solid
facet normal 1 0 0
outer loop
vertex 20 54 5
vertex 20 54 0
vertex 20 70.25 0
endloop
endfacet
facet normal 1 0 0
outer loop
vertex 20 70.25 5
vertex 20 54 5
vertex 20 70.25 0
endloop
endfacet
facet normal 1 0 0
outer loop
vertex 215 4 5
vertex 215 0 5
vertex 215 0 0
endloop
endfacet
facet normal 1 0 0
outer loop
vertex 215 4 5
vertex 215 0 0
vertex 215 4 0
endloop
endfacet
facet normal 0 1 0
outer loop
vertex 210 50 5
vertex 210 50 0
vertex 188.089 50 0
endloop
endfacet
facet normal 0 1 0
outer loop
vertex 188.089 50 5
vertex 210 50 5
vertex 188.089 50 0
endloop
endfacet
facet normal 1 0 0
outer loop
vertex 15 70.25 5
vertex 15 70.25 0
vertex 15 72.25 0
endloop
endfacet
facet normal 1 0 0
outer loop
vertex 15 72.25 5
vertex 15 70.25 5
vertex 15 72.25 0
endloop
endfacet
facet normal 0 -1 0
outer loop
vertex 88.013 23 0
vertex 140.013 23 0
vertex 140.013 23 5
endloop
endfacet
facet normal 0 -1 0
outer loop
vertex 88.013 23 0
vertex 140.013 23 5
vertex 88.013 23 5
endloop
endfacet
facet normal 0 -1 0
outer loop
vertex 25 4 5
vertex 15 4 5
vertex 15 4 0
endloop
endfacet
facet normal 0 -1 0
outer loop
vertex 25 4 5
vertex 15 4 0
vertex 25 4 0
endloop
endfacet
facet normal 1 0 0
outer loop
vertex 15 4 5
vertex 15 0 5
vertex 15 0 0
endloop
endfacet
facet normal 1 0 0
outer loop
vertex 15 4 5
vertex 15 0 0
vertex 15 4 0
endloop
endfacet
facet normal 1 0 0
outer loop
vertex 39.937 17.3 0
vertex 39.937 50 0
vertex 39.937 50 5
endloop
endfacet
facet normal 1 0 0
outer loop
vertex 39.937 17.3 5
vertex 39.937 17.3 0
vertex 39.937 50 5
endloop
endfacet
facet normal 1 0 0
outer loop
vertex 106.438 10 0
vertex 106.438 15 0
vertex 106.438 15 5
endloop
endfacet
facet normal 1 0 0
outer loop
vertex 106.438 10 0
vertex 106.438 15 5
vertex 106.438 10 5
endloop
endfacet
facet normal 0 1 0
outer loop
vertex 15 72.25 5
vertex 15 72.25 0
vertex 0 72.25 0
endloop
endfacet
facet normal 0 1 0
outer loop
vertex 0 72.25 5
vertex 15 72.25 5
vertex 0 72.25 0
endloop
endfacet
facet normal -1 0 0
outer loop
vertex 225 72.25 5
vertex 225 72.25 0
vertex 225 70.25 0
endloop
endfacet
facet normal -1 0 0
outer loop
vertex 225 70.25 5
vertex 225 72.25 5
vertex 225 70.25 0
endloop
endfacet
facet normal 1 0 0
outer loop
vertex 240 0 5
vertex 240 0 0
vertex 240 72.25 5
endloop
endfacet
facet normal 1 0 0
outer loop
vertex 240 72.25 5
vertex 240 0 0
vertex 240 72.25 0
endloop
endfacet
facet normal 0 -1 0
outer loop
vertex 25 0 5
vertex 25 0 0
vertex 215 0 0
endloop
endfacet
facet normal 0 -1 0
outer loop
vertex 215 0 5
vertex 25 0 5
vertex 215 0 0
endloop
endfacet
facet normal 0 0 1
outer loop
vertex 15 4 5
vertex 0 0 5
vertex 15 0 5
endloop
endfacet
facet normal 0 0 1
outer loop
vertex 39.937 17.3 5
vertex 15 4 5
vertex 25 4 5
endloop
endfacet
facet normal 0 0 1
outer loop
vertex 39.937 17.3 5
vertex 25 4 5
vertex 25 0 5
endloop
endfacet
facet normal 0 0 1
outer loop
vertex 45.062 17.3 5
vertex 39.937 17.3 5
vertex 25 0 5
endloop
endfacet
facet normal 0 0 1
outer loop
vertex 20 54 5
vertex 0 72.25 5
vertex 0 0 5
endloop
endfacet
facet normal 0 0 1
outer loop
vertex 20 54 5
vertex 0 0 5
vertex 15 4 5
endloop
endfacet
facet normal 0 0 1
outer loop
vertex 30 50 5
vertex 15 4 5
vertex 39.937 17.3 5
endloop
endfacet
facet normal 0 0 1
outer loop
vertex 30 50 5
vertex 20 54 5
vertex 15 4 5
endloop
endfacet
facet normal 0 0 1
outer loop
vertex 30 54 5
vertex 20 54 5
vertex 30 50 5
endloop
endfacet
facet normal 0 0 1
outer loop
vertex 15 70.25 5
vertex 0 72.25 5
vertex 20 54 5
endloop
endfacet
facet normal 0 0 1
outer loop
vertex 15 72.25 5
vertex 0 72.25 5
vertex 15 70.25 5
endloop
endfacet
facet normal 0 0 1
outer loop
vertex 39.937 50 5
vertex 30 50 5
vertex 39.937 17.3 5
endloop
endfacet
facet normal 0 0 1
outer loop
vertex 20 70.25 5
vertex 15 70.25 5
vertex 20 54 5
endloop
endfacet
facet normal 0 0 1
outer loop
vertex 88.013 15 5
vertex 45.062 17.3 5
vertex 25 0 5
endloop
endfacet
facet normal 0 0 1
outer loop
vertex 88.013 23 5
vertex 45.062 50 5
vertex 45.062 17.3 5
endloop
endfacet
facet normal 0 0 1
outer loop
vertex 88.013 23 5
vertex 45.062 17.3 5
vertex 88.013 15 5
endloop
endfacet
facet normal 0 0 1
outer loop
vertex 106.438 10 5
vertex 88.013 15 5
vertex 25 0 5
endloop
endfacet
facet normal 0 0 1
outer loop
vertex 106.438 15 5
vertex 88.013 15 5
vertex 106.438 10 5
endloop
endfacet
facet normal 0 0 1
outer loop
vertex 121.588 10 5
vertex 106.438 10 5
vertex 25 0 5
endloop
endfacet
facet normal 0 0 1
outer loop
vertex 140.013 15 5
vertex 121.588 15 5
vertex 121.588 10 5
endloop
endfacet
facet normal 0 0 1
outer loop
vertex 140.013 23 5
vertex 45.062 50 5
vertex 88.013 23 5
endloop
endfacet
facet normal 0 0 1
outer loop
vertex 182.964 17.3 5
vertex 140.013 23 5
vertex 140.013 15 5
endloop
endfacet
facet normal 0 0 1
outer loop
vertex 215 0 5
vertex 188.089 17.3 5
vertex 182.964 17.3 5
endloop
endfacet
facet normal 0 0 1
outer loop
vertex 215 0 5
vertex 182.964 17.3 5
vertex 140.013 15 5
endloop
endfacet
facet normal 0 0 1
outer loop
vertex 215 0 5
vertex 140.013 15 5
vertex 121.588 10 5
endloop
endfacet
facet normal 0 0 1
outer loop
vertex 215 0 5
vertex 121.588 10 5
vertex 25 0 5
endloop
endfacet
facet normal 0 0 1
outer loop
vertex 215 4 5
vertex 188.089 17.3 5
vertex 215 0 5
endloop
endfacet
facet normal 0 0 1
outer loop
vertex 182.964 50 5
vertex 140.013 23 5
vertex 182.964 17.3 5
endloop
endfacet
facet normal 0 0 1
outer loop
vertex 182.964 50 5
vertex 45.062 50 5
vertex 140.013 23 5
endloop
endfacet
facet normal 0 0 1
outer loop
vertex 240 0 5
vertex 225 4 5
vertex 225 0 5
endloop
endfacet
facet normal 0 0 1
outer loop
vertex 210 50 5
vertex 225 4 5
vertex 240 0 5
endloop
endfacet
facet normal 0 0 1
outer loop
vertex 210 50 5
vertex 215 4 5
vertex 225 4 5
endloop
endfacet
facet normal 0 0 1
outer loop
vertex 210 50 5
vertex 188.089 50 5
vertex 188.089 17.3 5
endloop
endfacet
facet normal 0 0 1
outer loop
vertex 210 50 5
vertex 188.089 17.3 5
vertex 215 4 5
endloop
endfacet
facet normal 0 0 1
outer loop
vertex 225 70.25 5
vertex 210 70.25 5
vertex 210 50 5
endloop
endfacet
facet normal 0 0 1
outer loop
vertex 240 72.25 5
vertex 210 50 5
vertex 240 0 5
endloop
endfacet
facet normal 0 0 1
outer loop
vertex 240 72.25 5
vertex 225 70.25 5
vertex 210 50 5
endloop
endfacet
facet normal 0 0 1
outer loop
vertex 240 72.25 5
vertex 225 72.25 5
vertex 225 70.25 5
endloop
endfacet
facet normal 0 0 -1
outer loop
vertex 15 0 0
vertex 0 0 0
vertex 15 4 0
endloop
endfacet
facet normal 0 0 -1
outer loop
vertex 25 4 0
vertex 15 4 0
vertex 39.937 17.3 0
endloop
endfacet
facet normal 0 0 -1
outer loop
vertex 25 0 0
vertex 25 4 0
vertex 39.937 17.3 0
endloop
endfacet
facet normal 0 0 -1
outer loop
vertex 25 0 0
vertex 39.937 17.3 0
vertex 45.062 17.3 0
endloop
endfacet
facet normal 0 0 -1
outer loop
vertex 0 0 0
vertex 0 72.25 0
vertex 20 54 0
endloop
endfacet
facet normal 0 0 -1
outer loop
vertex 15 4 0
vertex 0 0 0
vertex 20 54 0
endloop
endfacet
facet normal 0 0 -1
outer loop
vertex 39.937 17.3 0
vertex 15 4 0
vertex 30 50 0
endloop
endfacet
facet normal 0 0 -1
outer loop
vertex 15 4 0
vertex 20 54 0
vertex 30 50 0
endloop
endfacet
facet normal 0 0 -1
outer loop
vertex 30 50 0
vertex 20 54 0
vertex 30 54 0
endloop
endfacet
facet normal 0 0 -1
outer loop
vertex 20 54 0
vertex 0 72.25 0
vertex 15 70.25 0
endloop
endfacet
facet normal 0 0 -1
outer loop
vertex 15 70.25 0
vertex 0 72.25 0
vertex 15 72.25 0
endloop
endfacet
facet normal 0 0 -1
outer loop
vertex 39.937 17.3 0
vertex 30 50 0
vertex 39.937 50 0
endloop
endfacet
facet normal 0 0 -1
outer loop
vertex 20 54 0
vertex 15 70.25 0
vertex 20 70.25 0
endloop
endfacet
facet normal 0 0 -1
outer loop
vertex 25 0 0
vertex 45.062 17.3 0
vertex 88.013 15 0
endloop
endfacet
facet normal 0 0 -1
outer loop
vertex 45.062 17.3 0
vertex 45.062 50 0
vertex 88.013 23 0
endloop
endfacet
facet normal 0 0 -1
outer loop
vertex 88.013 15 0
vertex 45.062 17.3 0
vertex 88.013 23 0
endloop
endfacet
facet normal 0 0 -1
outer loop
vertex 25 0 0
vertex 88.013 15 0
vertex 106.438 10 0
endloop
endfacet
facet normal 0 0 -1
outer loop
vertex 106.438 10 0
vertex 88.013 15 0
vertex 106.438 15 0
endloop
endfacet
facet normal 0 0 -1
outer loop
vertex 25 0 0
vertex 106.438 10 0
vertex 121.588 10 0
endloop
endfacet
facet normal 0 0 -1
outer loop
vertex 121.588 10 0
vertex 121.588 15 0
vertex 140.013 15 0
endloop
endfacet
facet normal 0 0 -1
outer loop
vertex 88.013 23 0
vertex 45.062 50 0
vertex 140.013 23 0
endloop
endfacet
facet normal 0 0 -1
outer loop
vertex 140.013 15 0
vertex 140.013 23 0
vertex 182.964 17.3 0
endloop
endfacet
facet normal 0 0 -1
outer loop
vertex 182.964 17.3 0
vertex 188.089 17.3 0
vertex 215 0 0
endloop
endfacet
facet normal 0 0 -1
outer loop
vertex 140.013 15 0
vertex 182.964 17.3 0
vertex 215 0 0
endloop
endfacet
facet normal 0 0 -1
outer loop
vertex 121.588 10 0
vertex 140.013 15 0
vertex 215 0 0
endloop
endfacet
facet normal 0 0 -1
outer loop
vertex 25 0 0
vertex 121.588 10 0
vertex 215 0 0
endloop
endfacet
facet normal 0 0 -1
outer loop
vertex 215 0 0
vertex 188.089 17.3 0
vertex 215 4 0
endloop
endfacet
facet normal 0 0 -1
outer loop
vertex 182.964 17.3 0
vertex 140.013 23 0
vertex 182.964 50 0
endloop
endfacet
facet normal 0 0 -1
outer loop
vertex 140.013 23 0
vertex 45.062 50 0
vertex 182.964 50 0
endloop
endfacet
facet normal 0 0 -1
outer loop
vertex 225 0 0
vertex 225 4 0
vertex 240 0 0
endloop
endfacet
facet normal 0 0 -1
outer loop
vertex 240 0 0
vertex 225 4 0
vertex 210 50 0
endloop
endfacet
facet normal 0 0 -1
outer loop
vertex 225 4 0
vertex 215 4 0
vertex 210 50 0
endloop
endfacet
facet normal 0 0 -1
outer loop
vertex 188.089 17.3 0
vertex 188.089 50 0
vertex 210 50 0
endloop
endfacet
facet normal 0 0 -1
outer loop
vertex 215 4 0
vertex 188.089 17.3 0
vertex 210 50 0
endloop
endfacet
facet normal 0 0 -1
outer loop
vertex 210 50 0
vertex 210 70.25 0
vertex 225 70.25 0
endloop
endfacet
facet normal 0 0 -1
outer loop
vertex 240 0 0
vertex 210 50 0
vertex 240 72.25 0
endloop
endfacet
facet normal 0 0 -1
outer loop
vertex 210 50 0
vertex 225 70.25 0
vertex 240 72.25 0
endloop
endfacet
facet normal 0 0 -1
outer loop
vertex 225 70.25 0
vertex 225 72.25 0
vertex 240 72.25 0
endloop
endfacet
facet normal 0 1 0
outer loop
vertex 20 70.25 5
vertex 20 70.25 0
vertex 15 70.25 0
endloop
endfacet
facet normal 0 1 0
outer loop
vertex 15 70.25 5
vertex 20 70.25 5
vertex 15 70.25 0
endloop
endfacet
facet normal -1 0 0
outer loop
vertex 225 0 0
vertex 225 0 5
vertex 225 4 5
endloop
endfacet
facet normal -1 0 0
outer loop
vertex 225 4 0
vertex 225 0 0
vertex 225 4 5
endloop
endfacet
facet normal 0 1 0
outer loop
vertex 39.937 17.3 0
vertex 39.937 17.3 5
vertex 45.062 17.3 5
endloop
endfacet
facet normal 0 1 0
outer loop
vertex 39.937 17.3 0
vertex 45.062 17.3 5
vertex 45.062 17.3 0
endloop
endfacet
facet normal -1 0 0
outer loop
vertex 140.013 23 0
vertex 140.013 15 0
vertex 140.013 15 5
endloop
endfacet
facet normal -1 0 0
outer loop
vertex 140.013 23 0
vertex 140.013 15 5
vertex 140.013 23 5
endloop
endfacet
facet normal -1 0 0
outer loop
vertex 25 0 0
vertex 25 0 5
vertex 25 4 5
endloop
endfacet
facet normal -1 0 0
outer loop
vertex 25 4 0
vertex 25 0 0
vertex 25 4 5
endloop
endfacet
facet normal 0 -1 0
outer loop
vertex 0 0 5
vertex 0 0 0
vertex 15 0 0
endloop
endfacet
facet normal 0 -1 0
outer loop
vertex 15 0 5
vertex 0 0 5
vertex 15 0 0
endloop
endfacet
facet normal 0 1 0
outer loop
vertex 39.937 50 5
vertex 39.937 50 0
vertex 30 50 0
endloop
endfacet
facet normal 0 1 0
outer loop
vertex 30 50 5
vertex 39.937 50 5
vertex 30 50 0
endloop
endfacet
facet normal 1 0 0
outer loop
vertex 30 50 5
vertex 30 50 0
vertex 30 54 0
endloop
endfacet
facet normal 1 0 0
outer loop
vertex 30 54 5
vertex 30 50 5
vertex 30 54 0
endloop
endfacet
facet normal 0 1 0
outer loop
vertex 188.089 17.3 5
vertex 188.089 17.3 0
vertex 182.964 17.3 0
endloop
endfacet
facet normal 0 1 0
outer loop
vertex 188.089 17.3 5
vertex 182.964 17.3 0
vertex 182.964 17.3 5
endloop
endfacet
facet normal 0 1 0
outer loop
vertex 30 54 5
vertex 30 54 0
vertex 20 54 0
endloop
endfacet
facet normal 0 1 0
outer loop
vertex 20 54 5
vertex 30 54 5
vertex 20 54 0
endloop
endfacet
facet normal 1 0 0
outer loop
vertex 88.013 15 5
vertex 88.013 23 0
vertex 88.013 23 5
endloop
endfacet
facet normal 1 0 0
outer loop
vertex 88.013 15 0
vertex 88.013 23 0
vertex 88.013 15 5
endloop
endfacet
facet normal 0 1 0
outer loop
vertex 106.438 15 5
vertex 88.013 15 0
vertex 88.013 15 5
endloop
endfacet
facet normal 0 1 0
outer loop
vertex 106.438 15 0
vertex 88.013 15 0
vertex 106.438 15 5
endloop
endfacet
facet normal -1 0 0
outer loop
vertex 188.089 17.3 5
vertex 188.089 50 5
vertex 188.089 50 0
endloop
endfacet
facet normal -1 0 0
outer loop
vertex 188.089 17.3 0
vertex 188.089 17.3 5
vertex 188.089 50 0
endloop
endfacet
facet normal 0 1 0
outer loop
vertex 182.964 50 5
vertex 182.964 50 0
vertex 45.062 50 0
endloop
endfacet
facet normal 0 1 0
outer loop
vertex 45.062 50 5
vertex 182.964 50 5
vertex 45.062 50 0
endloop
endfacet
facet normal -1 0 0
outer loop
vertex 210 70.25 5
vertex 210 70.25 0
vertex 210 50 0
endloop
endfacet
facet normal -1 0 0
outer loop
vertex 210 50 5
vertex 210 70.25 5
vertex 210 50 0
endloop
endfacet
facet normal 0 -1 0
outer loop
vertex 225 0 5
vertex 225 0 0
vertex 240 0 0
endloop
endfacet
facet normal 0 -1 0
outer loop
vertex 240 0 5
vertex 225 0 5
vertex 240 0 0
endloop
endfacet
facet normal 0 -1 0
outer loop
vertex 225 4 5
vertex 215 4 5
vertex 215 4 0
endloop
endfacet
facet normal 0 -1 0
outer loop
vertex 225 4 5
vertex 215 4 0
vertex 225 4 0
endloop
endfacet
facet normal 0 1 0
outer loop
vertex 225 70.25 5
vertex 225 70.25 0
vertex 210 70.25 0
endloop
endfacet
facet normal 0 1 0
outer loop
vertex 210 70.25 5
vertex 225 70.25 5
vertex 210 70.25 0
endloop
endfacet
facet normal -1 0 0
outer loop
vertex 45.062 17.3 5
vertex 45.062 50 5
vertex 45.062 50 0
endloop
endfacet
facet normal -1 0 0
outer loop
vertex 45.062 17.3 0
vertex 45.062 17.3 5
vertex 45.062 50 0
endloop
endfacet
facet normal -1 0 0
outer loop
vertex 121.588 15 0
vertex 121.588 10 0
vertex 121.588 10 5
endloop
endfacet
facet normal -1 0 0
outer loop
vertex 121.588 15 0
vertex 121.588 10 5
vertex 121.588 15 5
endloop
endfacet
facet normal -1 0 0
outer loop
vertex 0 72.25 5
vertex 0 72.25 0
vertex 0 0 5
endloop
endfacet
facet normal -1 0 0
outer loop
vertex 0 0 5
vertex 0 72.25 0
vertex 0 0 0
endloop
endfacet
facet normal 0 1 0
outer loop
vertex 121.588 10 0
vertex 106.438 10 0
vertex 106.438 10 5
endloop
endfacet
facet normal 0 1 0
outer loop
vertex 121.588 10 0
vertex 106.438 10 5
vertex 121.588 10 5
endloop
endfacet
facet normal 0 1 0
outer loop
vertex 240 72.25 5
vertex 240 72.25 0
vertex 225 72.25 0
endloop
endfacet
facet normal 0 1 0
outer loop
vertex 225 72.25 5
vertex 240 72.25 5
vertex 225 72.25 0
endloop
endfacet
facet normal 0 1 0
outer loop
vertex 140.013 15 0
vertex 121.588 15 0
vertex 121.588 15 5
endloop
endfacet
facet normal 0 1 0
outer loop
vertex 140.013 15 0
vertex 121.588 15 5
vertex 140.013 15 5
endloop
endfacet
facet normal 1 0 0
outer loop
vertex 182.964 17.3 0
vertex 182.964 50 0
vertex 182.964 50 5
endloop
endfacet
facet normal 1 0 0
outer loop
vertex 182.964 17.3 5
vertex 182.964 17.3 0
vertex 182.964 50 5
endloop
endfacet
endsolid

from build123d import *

# Parameters (mm, degrees)
BOSS_EXTRUDE1_DEPTH = 5
CUT_EXTRUDE6_DEPTH  = 32.7
CUT_EXTRUDE7_DEPTH  = 32.7
CUT_EXTRUDE8_DEPTH  = 50
SKETCH10_W          = 10
SKETCH10_H          = 4
CUT_EXTRUDE9_DEPTH  = 6


with BuildPart() as part:
    # Sketch1 → Boss-Extrude1 (new body)
    with BuildSketch(Plane.XY):
        Polygon((0, 0), (240, 0), (240, 72.25), (225, 72.25), (225, 70.25), (210, 70.25), (210, 54), (210, 50), (30, 50), (30, 54), (20, 54), (20, 70.25), (15, 70.25), (15, 72.25), (0, 72.25), align=None)
    extrude(amount=BOSS_EXTRUDE1_DEPTH)

    # Sketch7 → Cut-Extrude6 (cut)
    with BuildSketch(Plane(origin=(76.962340789, 50, 79.982193432), x_dir=(0.299340075, 0, -0.954146488), z_dir=(0, -1, 0))):
        Polygon((89.56567359, 88.367941315), (121.015834787, 78.501224076), (119.481716905, 73.611223328), (88.031555708, 83.477940566), align=None)
    extrude(amount=CUT_EXTRUDE6_DEPTH, mode=Mode.SUBTRACT)

    # Sketch8 → Cut-Extrude7 (cut)
    with BuildSketch(Plane(origin=(151.064056229, 50, -36.816333928), x_dir=(-0.299340075, 0, 0.954146488), z_dir=(0, -1, 0))):
        Polygon((48.269879058, 101.323484697), (121.015834787, 78.501224076), (119.481716905, 73.611223328), (46.735761176, 96.433483948), align=None)
    extrude(amount=CUT_EXTRUDE7_DEPTH, mode=Mode.SUBTRACT)

    # Sketch9 → Cut-Extrude8 (cut)
    with BuildSketch(Plane(origin=(179.822929518, 98.166866164, 0), x_dir=(-1, 0, 0), z_dir=(0, 0, -1))):
        Polygon((91.809731009, -83.166866164), (73.384731009, -83.166866164), (73.384731009, -88.166866164), (58.234731009, -88.166866164), (58.234731009, -83.166866164), (39.809731009, -83.166866164), (39.809731009, -75.166866164), (91.809731009, -75.166866164), align=None)
    extrude(amount=-CUT_EXTRUDE8_DEPTH, mode=Mode.SUBTRACT)

    # Sketch10 → Cut-Extrude9 (cut, through all)
    with BuildSketch(Plane.XY.offset(5)):
        with Locations((20, 2)):
            Rectangle(SKETCH10_W, SKETCH10_H)
        with Locations((220, 2)):
            Rectangle(SKETCH10_W, SKETCH10_H)
    extrude(amount=-CUT_EXTRUDE9_DEPTH, mode=Mode.SUBTRACT)


solid = part.part
